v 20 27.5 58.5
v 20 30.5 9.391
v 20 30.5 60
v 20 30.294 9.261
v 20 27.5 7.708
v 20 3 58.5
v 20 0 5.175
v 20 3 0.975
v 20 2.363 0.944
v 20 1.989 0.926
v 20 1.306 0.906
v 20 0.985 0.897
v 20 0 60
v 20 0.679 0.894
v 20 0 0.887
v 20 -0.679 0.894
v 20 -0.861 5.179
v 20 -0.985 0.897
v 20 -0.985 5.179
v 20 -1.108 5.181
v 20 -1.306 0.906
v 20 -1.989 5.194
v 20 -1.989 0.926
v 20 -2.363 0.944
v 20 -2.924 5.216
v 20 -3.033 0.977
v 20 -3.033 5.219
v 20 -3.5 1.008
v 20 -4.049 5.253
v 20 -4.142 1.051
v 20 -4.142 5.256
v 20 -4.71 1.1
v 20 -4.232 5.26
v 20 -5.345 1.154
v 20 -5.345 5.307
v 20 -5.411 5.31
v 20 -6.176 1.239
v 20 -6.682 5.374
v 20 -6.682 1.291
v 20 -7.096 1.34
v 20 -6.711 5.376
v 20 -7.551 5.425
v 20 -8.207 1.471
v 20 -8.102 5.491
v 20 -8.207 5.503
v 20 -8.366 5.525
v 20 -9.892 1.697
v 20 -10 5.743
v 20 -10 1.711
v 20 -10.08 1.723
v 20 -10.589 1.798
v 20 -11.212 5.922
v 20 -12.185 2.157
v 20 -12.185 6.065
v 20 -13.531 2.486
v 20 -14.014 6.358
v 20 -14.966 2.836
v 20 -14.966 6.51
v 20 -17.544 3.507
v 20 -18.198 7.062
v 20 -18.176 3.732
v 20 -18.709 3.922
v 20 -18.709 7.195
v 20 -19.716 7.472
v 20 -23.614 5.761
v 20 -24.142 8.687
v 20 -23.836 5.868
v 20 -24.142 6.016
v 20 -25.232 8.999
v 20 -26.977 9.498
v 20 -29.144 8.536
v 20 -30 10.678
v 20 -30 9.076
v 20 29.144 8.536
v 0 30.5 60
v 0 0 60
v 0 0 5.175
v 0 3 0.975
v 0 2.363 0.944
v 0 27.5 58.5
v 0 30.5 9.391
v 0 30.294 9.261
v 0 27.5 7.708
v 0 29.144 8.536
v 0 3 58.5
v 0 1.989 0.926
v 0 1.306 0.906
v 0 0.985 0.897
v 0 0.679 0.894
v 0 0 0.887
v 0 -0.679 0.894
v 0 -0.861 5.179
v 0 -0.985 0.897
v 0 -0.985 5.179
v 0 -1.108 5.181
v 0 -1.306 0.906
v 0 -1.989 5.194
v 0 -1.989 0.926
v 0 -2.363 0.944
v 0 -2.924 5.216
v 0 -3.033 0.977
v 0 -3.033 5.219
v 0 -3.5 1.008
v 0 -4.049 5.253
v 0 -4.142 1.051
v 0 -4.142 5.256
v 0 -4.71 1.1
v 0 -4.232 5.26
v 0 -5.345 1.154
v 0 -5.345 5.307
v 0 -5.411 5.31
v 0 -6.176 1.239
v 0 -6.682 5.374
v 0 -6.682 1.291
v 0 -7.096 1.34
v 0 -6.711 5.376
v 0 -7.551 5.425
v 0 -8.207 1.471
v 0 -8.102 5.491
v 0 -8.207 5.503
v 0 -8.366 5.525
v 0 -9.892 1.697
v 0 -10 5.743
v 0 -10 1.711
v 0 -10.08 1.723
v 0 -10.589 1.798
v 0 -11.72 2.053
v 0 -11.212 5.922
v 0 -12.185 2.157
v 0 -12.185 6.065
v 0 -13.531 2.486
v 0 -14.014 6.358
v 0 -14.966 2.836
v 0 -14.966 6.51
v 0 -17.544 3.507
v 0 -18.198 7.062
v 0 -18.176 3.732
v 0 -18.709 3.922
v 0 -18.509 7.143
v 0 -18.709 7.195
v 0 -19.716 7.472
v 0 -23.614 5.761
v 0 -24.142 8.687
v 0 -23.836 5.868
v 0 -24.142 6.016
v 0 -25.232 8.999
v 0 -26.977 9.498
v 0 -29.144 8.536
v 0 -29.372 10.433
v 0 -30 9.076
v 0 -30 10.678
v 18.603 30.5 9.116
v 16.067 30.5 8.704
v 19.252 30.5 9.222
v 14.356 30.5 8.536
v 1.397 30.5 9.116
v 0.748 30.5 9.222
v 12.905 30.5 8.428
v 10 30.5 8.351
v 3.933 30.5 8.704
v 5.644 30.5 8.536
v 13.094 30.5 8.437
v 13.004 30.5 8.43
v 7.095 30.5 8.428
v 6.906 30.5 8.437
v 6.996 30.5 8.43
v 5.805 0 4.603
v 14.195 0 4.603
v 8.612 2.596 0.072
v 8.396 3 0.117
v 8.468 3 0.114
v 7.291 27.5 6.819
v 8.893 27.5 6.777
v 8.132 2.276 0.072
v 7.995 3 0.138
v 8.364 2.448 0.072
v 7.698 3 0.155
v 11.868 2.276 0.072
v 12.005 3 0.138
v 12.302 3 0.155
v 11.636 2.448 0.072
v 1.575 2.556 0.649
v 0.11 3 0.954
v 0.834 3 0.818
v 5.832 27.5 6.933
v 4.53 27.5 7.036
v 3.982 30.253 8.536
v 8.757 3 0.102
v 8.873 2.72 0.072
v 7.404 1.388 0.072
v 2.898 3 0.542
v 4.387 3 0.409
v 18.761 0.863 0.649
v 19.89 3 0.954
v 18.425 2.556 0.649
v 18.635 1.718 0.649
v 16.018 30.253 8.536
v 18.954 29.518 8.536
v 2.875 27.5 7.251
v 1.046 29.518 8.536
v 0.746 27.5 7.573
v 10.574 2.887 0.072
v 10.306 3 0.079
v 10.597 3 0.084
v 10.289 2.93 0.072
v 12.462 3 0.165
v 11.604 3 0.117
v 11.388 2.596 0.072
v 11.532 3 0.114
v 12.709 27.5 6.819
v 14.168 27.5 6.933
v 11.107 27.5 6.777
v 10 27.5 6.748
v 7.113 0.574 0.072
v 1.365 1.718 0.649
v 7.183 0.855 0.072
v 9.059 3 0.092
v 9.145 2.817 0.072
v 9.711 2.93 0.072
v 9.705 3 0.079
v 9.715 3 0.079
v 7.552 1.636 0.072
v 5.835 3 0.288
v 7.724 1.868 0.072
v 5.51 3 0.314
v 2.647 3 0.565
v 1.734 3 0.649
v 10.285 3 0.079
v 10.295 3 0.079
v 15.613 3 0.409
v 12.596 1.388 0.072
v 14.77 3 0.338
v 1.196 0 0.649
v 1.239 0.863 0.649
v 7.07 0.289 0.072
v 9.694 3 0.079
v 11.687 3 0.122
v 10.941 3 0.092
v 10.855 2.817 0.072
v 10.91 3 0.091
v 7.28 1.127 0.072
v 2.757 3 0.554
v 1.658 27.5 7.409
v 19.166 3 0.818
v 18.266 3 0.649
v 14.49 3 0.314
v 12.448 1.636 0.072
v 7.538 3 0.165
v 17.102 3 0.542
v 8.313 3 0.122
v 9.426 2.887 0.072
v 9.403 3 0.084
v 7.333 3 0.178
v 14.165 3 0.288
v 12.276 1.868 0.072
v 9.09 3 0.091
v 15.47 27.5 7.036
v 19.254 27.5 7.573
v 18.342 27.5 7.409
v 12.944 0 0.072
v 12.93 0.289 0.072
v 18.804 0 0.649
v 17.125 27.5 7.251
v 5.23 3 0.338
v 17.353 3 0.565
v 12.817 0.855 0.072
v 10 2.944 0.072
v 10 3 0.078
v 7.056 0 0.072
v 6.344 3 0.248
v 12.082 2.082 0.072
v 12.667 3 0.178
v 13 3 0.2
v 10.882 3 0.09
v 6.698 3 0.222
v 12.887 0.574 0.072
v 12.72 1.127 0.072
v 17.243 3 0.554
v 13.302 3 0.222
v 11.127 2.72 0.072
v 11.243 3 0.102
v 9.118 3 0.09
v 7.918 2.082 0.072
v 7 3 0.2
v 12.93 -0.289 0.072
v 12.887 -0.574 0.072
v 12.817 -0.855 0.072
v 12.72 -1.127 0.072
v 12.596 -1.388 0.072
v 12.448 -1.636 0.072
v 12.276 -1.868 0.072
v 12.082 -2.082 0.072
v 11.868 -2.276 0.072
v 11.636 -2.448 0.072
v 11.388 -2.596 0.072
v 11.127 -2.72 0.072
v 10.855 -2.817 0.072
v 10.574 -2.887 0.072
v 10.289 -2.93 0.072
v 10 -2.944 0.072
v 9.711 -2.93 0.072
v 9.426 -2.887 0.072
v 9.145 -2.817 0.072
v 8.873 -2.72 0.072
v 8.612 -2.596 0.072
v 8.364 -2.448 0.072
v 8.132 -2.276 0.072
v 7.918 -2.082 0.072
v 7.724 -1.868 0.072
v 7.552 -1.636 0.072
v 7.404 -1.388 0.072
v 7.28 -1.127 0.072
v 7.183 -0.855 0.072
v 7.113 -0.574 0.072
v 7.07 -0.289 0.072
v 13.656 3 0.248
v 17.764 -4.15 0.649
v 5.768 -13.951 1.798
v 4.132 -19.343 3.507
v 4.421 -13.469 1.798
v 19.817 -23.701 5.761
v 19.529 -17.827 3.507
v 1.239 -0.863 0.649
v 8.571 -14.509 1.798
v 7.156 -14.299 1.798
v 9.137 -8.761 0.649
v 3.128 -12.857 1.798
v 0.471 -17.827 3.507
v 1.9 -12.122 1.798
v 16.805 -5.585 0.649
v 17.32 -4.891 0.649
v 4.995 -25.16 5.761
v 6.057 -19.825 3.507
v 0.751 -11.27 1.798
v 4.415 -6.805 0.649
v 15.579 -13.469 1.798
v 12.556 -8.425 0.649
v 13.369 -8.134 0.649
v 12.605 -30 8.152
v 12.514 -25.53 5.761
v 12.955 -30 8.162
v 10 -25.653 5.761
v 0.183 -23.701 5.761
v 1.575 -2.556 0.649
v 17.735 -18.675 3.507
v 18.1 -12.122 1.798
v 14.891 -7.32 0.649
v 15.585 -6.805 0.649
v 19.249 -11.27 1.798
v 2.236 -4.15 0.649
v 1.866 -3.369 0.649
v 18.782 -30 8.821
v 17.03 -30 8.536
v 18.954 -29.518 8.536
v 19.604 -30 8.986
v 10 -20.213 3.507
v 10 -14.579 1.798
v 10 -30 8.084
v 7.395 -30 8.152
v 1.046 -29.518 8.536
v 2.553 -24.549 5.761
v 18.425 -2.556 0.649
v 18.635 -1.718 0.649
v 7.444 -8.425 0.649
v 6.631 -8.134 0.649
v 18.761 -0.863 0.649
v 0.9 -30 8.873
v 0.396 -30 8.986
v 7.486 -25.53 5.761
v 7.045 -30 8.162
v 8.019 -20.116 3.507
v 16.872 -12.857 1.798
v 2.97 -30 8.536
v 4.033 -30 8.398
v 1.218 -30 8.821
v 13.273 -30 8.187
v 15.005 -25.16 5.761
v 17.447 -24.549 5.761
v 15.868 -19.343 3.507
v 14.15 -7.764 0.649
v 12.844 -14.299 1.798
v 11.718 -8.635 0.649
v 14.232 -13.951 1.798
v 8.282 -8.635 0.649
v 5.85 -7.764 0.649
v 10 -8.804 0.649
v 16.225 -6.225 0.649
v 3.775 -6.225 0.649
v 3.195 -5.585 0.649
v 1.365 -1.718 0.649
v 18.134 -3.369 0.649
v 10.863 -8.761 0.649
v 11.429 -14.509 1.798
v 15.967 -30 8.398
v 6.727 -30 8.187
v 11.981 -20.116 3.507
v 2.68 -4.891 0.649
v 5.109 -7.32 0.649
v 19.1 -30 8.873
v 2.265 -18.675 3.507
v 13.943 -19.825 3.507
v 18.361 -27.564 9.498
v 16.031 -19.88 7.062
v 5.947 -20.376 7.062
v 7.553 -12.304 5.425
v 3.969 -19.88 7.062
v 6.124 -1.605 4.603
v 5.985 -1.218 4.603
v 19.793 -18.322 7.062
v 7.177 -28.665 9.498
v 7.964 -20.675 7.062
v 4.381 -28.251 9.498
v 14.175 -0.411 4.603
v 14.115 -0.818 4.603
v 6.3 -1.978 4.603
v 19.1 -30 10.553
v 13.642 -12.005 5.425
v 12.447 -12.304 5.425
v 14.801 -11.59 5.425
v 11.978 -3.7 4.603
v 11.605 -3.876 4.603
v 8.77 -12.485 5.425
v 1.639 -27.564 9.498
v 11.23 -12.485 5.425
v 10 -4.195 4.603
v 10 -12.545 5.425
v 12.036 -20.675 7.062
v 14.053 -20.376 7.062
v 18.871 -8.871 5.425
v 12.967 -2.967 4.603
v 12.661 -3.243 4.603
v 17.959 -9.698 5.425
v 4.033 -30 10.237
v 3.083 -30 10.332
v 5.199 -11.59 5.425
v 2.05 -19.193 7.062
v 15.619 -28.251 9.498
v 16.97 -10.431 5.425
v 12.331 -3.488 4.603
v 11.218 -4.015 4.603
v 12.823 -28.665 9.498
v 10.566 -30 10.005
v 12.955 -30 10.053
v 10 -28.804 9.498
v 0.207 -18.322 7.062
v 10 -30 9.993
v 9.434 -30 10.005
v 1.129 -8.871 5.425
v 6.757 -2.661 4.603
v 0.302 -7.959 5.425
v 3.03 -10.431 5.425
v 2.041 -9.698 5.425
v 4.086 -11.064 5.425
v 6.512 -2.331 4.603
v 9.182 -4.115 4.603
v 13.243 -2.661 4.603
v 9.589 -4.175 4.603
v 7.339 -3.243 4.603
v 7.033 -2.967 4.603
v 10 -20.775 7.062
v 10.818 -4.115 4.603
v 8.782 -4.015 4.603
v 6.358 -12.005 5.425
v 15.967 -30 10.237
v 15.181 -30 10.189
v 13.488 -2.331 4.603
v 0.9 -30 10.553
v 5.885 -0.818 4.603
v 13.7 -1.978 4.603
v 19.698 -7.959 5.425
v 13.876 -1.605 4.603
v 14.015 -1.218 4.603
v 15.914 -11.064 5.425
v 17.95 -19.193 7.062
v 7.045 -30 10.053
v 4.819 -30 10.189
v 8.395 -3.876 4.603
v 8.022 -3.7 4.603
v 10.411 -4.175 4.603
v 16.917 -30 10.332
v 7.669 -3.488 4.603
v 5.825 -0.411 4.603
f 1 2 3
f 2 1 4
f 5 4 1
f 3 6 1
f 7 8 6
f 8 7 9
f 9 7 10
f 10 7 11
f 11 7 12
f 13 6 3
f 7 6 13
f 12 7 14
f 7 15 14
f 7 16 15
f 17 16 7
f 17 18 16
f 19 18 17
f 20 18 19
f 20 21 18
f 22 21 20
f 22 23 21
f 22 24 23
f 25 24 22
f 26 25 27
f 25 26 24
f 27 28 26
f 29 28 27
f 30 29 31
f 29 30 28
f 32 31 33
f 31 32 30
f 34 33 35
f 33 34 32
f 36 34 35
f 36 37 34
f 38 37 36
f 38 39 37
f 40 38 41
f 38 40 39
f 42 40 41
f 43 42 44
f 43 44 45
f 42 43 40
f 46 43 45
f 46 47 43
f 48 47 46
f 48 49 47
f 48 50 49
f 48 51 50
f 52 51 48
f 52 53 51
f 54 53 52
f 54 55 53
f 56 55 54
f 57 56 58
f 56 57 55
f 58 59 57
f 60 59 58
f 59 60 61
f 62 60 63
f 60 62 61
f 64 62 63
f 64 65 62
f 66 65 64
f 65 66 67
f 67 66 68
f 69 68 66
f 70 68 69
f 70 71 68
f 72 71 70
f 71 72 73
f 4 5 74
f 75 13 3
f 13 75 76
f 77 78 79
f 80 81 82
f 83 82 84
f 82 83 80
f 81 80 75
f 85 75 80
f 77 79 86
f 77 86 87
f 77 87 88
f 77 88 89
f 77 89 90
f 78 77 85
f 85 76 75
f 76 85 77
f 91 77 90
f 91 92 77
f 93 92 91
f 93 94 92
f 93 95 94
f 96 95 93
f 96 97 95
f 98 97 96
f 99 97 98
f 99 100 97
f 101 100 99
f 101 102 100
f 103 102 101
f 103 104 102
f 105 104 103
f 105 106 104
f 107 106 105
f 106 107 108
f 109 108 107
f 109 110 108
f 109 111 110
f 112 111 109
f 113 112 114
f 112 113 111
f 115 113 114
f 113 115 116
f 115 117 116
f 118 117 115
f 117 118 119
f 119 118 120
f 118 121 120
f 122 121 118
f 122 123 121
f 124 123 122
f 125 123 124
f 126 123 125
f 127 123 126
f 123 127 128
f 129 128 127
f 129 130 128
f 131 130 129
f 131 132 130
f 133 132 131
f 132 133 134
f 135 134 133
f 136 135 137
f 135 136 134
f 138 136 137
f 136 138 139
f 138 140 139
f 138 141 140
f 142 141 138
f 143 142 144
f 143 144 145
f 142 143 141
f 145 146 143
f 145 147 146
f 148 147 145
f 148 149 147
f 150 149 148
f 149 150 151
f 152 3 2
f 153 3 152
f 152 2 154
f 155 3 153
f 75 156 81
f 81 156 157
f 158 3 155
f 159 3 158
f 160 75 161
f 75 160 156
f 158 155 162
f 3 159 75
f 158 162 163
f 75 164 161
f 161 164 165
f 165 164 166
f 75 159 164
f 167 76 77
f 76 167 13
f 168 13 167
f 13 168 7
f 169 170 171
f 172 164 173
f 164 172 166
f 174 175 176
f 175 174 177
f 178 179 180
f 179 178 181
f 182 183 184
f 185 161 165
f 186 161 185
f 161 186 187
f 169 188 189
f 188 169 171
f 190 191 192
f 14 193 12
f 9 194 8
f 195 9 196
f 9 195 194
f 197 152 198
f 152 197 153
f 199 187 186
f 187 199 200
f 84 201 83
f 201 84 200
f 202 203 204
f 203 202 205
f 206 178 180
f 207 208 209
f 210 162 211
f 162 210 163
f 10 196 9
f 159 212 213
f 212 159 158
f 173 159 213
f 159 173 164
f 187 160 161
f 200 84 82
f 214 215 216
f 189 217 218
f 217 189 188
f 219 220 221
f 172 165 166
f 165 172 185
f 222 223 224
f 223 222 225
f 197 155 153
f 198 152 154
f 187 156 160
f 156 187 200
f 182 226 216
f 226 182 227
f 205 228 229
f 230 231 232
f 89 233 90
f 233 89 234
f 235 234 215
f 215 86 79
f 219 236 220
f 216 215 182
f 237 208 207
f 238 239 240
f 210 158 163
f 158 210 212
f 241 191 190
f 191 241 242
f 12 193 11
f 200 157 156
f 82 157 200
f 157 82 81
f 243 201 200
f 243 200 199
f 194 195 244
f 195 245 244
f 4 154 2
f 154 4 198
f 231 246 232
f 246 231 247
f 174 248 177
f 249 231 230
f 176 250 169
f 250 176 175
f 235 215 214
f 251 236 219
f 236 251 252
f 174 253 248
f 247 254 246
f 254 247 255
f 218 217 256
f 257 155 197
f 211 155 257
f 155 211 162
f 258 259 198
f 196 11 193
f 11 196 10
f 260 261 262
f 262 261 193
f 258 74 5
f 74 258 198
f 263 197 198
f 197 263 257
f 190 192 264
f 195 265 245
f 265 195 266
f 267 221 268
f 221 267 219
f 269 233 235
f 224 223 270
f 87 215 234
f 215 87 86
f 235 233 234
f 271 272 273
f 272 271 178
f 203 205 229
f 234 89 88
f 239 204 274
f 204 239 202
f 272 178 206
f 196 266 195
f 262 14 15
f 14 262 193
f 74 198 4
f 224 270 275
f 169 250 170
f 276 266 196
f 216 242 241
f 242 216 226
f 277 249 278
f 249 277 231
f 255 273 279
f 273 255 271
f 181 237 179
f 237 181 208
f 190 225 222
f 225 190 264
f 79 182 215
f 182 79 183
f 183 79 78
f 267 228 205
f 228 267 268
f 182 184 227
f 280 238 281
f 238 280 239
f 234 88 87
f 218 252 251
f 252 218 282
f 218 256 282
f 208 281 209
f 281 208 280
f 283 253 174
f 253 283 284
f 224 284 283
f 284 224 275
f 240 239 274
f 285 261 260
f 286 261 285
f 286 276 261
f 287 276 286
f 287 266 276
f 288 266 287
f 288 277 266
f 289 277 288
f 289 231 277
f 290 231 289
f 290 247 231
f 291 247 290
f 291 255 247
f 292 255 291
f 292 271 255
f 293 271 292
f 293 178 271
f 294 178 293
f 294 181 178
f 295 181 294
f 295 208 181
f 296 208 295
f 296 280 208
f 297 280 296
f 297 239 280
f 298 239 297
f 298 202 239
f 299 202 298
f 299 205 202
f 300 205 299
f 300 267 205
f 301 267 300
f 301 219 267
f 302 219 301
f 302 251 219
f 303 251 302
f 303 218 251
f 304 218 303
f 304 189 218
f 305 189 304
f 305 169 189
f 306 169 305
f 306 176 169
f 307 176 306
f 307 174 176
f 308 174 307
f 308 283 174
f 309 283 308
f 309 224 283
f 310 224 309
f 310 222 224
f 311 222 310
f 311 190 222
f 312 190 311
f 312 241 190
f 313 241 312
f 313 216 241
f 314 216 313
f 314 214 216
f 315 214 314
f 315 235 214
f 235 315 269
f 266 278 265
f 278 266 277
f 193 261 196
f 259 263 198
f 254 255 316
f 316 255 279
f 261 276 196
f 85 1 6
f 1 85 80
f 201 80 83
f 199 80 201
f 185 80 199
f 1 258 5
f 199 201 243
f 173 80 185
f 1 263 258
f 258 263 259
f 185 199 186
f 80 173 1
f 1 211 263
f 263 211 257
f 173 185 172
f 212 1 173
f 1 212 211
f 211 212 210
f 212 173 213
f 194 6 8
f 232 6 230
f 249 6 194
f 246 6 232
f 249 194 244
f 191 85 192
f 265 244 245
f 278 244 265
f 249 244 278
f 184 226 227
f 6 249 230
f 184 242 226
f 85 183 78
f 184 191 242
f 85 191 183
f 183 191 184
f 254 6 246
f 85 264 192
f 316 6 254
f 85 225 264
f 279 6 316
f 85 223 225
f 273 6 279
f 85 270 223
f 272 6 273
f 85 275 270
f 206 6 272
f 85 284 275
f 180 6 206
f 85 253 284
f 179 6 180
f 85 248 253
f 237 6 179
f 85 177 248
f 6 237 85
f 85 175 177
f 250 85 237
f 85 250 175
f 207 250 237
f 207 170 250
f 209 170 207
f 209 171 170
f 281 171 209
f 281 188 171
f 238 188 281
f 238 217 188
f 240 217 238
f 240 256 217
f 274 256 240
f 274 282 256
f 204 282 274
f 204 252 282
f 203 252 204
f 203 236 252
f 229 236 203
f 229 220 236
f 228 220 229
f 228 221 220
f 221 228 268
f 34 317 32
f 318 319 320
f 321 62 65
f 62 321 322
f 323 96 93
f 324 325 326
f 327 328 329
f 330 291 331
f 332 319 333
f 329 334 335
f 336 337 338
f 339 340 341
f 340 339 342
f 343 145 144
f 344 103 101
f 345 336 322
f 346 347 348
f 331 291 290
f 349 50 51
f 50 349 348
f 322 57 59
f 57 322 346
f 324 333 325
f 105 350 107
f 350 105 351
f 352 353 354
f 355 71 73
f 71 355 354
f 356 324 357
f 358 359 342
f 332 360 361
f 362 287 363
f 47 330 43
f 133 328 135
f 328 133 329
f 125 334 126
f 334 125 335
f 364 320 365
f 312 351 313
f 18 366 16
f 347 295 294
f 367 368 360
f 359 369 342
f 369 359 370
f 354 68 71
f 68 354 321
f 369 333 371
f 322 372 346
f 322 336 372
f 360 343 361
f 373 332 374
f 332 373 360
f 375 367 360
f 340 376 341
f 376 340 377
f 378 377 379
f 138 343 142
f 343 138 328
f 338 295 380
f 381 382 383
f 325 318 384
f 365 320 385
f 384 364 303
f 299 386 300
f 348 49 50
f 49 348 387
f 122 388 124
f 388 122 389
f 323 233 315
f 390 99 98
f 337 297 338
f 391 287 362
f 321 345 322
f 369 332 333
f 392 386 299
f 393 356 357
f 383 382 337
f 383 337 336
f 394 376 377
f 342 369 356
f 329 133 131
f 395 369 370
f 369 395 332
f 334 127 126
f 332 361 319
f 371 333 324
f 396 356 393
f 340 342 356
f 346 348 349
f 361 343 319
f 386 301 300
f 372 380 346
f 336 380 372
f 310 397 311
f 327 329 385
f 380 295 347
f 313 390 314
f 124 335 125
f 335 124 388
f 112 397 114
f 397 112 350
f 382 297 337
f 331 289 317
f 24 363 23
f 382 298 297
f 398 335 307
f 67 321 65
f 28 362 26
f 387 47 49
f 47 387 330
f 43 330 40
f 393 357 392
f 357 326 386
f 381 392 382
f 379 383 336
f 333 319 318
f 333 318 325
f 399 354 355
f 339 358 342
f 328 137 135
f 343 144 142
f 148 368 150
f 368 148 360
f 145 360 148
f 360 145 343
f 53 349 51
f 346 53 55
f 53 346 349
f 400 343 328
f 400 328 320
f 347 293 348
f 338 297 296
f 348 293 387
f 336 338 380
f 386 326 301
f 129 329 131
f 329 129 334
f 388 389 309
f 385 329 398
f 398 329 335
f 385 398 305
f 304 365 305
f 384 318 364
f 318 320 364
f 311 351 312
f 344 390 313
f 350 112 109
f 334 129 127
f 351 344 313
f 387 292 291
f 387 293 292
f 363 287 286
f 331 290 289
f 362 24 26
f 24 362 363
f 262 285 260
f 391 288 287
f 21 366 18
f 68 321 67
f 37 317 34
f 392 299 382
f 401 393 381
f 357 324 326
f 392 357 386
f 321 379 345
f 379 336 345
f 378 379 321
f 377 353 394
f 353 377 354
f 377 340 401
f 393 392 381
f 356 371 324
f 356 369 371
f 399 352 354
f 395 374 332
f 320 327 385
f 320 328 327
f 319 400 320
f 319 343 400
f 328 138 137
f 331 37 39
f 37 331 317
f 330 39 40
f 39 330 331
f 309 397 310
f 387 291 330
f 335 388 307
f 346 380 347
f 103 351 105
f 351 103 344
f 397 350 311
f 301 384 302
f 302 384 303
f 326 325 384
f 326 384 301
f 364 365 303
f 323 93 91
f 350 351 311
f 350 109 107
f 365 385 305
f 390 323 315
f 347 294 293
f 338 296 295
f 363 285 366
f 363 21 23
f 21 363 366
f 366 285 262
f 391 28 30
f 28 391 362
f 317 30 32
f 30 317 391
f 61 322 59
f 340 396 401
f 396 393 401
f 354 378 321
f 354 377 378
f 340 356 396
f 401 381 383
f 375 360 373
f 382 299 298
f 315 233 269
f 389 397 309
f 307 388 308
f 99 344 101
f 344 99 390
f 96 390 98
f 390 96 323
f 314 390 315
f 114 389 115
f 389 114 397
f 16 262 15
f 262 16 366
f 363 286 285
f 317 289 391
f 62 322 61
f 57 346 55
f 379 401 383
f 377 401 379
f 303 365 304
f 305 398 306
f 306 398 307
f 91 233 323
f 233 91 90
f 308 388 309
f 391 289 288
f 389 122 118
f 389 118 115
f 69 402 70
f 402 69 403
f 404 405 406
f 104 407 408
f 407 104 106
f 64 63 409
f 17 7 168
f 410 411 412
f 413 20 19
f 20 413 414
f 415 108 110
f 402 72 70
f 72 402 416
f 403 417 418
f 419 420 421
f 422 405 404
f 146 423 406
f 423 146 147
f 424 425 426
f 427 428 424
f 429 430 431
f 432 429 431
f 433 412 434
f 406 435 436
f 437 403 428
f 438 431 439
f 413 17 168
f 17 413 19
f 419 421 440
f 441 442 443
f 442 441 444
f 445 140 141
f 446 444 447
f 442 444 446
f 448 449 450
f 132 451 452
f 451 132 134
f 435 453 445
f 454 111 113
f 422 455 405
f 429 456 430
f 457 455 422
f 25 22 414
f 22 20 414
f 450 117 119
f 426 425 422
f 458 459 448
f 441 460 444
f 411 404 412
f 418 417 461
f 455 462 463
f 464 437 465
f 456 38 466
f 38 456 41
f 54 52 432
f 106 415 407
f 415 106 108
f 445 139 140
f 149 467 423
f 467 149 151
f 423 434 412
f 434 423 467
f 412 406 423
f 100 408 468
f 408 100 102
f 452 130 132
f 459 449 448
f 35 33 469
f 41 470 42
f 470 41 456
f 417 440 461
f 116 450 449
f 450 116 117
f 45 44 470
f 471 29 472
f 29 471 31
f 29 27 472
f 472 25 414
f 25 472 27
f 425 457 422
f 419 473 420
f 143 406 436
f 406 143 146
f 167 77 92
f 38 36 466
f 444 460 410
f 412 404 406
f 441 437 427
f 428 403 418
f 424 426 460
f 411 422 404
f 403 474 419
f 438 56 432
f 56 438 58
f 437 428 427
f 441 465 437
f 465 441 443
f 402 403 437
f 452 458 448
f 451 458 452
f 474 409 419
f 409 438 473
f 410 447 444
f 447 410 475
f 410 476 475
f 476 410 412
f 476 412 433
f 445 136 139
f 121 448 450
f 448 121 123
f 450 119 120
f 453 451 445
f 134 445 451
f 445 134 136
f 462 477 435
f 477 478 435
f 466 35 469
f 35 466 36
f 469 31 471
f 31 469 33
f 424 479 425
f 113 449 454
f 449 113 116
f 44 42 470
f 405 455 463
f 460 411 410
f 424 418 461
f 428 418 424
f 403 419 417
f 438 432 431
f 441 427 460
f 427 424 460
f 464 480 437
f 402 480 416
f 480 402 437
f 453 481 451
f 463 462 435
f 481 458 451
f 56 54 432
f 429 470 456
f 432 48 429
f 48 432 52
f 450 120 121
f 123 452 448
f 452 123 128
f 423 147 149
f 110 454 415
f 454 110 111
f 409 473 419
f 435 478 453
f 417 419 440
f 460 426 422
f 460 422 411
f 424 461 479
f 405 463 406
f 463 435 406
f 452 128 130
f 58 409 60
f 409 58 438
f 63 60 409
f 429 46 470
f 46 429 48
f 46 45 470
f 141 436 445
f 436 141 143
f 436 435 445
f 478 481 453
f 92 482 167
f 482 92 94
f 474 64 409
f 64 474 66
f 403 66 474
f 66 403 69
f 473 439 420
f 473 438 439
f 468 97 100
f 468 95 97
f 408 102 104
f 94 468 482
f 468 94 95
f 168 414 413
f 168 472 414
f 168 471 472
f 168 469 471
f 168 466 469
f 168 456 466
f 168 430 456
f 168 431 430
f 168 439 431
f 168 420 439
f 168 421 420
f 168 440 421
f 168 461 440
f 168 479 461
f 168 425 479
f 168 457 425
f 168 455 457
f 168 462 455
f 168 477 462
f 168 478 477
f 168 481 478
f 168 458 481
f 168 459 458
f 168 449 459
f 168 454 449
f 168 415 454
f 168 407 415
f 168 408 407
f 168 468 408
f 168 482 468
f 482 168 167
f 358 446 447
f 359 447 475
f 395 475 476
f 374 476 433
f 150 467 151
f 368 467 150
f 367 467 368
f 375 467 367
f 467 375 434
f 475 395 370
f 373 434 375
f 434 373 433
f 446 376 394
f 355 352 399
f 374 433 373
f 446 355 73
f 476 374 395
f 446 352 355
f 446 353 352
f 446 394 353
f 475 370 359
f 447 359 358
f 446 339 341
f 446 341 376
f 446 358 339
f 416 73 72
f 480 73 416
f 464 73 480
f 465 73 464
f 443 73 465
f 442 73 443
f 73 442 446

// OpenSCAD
thick = 1.5;
gap = 24.5;
W = 20;
H = 60;

difference() {
    intersection() {
        cube([W, thick * 4 + gap, H]);
        translate([W / 2, 0, H])
            sphere(r = H, h = H, $fn = 64);
    }
    translate([0, thick * 2, 0])
        cube([W, gap, H - thick]);
}

intersection() {
    difference() {
        translate([W / 2, 0, H])
            sphere(r = H, h = H, $fn = 64);
        translate([W / 2, 0, H + 30])
            sphere(r = H + 30 - thick * 3, h = H, $fn = 64);
    }
    translate([0, -H / 2, 0])
        cube([W, H / 2, H]);
}
